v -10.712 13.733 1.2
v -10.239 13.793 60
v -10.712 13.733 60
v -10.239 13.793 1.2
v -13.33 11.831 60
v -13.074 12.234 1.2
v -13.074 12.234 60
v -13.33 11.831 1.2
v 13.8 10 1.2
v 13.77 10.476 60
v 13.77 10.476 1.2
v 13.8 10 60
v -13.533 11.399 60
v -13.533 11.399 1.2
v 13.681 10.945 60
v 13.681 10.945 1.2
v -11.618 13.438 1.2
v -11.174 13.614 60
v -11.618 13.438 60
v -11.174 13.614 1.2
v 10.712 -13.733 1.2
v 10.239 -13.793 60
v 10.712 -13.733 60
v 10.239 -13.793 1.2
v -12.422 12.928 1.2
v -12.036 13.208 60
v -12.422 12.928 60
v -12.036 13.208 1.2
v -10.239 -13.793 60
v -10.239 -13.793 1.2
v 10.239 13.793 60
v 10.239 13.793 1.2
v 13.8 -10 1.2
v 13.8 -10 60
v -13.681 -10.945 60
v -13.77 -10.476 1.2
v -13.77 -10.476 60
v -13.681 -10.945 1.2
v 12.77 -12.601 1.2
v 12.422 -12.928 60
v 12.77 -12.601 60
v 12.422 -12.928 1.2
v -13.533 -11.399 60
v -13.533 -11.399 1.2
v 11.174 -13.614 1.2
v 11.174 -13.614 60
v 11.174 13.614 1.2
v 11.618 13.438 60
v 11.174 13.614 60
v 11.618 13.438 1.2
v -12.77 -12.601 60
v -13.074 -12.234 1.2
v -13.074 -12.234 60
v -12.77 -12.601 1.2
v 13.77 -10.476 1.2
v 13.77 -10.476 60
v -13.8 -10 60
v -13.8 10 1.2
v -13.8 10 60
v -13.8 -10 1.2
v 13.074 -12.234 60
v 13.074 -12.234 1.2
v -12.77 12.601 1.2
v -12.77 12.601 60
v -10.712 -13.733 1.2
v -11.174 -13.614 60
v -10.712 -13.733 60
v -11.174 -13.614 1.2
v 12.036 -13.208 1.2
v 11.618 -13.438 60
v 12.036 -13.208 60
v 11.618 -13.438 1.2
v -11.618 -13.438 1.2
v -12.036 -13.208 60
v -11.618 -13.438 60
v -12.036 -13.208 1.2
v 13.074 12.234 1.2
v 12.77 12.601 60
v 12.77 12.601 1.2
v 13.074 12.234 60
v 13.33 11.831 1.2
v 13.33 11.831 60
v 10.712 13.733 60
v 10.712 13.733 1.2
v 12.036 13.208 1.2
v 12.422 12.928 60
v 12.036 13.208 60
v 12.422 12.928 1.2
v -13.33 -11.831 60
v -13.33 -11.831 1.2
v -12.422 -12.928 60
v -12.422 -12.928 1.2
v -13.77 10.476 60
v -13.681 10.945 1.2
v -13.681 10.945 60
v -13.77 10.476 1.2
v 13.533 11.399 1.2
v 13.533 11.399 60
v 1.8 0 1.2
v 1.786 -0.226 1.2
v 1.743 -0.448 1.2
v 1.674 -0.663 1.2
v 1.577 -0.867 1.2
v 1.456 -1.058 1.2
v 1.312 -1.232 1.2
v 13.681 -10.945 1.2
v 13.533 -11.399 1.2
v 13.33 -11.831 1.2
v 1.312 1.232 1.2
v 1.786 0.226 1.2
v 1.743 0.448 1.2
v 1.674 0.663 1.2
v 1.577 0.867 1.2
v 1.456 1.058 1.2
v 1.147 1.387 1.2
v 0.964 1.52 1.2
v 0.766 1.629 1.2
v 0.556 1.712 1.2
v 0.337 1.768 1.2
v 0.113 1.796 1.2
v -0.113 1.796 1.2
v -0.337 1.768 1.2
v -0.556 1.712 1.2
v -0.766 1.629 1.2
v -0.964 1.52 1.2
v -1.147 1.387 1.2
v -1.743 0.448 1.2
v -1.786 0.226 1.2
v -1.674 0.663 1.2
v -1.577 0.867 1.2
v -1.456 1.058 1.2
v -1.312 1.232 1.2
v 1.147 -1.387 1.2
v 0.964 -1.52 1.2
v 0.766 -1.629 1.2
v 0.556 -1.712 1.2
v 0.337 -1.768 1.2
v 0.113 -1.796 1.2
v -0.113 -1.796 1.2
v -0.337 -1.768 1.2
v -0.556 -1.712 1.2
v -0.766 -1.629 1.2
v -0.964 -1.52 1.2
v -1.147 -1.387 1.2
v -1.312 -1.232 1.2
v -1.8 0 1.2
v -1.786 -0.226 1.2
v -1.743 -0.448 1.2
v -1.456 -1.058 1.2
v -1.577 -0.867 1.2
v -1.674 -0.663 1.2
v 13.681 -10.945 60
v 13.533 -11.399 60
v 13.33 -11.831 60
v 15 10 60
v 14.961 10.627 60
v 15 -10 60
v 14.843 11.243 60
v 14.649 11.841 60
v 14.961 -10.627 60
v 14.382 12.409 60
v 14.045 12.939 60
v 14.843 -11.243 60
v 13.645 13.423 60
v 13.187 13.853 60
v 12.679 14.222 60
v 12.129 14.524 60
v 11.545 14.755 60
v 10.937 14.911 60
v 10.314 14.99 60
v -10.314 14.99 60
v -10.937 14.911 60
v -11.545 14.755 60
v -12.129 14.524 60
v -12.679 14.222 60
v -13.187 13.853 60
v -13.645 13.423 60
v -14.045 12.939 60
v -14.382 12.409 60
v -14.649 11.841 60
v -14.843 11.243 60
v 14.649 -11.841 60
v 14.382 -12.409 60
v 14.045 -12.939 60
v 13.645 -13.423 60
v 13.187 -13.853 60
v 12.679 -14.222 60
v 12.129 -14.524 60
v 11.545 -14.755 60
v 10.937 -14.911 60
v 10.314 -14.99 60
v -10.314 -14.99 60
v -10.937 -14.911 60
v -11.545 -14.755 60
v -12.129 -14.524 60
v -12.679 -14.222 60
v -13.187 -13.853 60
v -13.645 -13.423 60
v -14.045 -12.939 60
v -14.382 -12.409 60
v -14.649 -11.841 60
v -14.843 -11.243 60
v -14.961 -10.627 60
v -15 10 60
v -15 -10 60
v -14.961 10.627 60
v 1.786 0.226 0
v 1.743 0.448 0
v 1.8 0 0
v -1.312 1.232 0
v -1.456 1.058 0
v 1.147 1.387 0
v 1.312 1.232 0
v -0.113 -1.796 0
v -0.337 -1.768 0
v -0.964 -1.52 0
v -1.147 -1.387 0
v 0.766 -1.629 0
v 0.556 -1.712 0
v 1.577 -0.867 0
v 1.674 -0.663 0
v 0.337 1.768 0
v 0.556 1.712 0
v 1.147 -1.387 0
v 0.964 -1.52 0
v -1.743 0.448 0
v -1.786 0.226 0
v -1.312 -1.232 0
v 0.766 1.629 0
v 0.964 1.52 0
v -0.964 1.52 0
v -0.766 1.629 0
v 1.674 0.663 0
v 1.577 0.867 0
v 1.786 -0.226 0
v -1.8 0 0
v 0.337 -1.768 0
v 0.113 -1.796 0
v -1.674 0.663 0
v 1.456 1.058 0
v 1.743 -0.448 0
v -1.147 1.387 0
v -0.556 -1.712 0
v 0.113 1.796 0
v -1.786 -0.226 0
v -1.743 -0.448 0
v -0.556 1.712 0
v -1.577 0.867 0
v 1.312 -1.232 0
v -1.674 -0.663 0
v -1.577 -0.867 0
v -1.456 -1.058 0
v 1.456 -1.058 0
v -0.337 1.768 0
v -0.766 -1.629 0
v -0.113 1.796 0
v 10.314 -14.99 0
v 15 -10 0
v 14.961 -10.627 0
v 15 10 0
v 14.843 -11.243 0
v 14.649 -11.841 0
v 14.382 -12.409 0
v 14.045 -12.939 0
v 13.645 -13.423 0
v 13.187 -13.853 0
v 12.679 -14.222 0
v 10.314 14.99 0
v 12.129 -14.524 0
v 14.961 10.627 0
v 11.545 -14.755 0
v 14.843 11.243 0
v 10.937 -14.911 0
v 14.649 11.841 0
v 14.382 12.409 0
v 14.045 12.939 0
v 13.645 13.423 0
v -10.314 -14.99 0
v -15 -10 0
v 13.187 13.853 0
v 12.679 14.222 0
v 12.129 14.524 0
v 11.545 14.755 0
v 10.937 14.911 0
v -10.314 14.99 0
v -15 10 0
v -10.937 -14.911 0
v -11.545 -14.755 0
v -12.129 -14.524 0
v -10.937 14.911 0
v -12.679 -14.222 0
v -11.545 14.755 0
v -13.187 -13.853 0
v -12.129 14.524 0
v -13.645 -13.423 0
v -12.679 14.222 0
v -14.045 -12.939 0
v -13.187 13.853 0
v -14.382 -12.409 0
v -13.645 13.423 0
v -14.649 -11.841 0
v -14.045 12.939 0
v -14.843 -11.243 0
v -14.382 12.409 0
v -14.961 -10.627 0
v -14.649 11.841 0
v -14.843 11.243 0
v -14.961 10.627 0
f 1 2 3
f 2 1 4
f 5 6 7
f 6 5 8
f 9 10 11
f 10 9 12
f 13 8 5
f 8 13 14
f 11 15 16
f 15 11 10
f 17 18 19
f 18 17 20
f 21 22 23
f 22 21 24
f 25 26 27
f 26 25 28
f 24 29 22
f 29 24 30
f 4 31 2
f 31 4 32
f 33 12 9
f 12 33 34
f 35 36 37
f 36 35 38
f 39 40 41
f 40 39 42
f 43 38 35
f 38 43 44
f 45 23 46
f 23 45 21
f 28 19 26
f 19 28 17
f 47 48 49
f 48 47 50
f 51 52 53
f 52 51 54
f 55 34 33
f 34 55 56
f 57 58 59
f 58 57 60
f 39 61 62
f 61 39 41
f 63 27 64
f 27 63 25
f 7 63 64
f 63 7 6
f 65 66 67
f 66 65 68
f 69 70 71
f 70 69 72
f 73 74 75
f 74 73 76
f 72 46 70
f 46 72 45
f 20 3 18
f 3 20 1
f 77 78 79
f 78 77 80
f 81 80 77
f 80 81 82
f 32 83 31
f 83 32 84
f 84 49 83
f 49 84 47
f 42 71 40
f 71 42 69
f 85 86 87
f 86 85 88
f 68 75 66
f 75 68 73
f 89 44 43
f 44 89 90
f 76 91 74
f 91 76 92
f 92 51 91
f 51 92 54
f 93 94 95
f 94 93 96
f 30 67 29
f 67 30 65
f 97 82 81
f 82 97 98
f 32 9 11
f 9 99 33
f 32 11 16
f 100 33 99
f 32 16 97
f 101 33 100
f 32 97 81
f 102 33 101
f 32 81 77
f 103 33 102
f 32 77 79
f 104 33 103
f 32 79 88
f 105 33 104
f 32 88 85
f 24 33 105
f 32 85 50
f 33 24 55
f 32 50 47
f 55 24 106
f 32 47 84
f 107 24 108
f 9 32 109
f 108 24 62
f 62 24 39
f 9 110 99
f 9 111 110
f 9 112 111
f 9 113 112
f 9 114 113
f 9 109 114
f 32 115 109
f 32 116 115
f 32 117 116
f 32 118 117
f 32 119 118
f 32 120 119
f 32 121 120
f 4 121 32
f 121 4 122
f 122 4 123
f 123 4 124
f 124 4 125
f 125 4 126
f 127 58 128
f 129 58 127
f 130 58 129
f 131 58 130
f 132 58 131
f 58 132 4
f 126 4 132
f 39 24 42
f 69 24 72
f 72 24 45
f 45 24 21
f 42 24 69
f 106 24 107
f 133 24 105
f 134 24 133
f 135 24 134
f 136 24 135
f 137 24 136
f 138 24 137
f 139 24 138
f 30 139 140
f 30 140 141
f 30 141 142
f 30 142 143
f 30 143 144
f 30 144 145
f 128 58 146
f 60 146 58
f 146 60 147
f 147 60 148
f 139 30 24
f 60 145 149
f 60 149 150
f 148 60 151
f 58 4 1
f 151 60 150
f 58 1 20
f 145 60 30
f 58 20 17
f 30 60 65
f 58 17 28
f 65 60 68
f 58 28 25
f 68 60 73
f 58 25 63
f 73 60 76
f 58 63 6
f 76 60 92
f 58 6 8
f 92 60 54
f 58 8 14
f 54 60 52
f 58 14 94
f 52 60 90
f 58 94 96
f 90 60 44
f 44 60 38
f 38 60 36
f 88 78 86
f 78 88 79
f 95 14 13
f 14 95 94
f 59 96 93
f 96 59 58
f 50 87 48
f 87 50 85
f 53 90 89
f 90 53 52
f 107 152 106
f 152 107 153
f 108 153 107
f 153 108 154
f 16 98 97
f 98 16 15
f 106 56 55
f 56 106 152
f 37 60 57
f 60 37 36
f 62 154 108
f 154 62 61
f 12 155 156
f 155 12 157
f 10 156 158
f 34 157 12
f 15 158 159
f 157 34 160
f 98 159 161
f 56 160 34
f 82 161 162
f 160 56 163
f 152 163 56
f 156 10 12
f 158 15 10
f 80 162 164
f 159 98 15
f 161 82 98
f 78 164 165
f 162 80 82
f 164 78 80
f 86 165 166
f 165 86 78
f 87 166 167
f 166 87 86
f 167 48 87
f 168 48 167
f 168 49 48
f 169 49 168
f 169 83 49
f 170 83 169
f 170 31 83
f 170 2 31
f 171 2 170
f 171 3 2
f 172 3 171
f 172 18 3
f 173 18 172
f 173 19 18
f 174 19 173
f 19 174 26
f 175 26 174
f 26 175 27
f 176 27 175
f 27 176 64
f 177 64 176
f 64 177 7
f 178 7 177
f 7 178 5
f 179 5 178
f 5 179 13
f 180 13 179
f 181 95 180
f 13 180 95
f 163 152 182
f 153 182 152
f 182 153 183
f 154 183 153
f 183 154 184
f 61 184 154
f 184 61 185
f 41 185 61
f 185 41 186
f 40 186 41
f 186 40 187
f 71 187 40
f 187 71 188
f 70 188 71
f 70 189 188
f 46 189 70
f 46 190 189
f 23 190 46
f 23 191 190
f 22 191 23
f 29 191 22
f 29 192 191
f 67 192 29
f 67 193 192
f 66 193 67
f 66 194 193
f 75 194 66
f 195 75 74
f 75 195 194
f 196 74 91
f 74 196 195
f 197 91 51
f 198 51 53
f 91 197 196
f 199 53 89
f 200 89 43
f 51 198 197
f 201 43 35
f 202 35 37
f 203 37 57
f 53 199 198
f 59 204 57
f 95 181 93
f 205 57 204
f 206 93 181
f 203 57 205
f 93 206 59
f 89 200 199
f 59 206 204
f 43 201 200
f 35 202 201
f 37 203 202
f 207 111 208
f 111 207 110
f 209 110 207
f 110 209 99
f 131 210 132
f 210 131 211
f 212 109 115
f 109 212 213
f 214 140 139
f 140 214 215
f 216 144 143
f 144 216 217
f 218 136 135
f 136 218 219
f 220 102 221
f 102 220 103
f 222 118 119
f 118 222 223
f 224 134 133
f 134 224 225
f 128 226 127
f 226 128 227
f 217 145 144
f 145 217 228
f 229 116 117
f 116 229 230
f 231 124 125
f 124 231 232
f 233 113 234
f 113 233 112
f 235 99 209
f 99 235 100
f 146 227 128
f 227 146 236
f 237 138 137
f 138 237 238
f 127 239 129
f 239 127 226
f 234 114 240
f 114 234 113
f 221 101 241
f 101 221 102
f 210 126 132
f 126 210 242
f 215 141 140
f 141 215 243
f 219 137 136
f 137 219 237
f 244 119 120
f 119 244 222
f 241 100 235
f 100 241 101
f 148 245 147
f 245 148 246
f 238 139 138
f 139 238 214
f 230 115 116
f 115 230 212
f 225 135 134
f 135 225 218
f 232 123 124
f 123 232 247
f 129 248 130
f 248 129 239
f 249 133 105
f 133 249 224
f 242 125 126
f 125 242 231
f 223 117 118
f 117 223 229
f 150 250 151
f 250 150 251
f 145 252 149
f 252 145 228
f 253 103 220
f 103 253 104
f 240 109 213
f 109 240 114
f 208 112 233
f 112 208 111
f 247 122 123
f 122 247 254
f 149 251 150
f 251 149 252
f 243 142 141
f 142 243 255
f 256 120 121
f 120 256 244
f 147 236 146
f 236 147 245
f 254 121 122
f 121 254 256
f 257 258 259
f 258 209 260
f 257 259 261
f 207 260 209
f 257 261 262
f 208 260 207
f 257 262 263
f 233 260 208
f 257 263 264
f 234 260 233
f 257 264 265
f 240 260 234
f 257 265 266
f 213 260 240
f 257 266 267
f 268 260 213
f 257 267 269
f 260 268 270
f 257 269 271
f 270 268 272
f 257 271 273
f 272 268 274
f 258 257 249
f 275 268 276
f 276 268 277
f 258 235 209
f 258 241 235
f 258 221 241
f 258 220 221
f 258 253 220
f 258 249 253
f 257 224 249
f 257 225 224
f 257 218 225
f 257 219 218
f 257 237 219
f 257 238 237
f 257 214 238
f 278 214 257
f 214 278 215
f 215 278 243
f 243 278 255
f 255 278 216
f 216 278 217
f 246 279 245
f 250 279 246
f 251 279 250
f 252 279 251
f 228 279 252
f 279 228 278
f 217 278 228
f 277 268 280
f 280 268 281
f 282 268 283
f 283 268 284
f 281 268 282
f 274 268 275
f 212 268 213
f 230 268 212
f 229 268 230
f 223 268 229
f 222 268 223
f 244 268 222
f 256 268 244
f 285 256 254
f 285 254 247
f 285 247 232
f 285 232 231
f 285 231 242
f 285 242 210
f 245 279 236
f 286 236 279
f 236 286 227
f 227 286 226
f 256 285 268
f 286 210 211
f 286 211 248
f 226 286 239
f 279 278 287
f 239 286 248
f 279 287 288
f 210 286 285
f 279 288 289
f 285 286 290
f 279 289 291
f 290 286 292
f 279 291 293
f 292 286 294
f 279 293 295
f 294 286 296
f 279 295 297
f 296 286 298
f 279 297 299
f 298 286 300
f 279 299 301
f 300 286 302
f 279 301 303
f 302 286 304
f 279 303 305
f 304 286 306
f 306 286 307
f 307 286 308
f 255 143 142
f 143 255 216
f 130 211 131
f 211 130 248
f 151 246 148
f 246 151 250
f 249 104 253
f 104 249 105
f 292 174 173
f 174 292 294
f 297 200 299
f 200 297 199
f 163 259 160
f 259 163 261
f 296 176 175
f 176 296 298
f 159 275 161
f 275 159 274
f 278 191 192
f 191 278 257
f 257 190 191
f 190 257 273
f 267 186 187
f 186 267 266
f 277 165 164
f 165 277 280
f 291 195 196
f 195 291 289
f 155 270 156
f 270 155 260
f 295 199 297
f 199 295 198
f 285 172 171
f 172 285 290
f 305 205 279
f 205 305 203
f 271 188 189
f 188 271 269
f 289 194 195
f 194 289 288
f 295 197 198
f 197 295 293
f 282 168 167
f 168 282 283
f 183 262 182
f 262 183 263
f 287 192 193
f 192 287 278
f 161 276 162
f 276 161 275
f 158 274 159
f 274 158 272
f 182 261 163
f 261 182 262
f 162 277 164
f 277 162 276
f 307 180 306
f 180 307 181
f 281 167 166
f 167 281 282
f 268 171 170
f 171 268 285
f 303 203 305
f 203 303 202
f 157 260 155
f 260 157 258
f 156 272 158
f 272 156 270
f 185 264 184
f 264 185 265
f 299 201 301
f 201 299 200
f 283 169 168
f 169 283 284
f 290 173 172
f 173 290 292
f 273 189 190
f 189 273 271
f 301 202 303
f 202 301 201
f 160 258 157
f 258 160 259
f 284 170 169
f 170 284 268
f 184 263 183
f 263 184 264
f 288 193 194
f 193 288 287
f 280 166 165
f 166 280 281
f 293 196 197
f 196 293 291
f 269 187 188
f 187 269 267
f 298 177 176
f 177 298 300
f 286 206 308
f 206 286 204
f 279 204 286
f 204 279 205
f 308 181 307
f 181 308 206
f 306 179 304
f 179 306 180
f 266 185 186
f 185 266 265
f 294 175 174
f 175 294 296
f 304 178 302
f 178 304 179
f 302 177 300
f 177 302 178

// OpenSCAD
$fn = 50;


difference() {
	union() {
		hull() {
			translate(v = [-10.0000000000, 10.0000000000, 0]) {
				cylinder(h = 60, r = 5);
			}
			translate(v = [10.0000000000, 10.0000000000, 0]) {
				cylinder(h = 60, r = 5);
			}
			translate(v = [-10.0000000000, -10.0000000000, 0]) {
				cylinder(h = 60, r = 5);
			}
			translate(v = [10.0000000000, -10.0000000000, 0]) {
				cylinder(h = 60, r = 5);
			}
		}
	}
	union() {
		translate(v = [0, 0, 1.2000000000]) {
			hull() {
				translate(v = [-10.0000000000, 10.0000000000, 0]) {
					cylinder(h = 58.8000000000, r = 3.8000000000);
				}
				translate(v = [10.0000000000, 10.0000000000, 0]) {
					cylinder(h = 58.8000000000, r = 3.8000000000);
				}
				translate(v = [-10.0000000000, -10.0000000000, 0]) {
					cylinder(h = 58.8000000000, r = 3.8000000000);
				}
				translate(v = [10.0000000000, -10.0000000000, 0]) {
					cylinder(h = 58.8000000000, r = 3.8000000000);
				}
			}
		}
		#cylinder(h = 1.2000000000, r = 1.8000000000);
	}
}
